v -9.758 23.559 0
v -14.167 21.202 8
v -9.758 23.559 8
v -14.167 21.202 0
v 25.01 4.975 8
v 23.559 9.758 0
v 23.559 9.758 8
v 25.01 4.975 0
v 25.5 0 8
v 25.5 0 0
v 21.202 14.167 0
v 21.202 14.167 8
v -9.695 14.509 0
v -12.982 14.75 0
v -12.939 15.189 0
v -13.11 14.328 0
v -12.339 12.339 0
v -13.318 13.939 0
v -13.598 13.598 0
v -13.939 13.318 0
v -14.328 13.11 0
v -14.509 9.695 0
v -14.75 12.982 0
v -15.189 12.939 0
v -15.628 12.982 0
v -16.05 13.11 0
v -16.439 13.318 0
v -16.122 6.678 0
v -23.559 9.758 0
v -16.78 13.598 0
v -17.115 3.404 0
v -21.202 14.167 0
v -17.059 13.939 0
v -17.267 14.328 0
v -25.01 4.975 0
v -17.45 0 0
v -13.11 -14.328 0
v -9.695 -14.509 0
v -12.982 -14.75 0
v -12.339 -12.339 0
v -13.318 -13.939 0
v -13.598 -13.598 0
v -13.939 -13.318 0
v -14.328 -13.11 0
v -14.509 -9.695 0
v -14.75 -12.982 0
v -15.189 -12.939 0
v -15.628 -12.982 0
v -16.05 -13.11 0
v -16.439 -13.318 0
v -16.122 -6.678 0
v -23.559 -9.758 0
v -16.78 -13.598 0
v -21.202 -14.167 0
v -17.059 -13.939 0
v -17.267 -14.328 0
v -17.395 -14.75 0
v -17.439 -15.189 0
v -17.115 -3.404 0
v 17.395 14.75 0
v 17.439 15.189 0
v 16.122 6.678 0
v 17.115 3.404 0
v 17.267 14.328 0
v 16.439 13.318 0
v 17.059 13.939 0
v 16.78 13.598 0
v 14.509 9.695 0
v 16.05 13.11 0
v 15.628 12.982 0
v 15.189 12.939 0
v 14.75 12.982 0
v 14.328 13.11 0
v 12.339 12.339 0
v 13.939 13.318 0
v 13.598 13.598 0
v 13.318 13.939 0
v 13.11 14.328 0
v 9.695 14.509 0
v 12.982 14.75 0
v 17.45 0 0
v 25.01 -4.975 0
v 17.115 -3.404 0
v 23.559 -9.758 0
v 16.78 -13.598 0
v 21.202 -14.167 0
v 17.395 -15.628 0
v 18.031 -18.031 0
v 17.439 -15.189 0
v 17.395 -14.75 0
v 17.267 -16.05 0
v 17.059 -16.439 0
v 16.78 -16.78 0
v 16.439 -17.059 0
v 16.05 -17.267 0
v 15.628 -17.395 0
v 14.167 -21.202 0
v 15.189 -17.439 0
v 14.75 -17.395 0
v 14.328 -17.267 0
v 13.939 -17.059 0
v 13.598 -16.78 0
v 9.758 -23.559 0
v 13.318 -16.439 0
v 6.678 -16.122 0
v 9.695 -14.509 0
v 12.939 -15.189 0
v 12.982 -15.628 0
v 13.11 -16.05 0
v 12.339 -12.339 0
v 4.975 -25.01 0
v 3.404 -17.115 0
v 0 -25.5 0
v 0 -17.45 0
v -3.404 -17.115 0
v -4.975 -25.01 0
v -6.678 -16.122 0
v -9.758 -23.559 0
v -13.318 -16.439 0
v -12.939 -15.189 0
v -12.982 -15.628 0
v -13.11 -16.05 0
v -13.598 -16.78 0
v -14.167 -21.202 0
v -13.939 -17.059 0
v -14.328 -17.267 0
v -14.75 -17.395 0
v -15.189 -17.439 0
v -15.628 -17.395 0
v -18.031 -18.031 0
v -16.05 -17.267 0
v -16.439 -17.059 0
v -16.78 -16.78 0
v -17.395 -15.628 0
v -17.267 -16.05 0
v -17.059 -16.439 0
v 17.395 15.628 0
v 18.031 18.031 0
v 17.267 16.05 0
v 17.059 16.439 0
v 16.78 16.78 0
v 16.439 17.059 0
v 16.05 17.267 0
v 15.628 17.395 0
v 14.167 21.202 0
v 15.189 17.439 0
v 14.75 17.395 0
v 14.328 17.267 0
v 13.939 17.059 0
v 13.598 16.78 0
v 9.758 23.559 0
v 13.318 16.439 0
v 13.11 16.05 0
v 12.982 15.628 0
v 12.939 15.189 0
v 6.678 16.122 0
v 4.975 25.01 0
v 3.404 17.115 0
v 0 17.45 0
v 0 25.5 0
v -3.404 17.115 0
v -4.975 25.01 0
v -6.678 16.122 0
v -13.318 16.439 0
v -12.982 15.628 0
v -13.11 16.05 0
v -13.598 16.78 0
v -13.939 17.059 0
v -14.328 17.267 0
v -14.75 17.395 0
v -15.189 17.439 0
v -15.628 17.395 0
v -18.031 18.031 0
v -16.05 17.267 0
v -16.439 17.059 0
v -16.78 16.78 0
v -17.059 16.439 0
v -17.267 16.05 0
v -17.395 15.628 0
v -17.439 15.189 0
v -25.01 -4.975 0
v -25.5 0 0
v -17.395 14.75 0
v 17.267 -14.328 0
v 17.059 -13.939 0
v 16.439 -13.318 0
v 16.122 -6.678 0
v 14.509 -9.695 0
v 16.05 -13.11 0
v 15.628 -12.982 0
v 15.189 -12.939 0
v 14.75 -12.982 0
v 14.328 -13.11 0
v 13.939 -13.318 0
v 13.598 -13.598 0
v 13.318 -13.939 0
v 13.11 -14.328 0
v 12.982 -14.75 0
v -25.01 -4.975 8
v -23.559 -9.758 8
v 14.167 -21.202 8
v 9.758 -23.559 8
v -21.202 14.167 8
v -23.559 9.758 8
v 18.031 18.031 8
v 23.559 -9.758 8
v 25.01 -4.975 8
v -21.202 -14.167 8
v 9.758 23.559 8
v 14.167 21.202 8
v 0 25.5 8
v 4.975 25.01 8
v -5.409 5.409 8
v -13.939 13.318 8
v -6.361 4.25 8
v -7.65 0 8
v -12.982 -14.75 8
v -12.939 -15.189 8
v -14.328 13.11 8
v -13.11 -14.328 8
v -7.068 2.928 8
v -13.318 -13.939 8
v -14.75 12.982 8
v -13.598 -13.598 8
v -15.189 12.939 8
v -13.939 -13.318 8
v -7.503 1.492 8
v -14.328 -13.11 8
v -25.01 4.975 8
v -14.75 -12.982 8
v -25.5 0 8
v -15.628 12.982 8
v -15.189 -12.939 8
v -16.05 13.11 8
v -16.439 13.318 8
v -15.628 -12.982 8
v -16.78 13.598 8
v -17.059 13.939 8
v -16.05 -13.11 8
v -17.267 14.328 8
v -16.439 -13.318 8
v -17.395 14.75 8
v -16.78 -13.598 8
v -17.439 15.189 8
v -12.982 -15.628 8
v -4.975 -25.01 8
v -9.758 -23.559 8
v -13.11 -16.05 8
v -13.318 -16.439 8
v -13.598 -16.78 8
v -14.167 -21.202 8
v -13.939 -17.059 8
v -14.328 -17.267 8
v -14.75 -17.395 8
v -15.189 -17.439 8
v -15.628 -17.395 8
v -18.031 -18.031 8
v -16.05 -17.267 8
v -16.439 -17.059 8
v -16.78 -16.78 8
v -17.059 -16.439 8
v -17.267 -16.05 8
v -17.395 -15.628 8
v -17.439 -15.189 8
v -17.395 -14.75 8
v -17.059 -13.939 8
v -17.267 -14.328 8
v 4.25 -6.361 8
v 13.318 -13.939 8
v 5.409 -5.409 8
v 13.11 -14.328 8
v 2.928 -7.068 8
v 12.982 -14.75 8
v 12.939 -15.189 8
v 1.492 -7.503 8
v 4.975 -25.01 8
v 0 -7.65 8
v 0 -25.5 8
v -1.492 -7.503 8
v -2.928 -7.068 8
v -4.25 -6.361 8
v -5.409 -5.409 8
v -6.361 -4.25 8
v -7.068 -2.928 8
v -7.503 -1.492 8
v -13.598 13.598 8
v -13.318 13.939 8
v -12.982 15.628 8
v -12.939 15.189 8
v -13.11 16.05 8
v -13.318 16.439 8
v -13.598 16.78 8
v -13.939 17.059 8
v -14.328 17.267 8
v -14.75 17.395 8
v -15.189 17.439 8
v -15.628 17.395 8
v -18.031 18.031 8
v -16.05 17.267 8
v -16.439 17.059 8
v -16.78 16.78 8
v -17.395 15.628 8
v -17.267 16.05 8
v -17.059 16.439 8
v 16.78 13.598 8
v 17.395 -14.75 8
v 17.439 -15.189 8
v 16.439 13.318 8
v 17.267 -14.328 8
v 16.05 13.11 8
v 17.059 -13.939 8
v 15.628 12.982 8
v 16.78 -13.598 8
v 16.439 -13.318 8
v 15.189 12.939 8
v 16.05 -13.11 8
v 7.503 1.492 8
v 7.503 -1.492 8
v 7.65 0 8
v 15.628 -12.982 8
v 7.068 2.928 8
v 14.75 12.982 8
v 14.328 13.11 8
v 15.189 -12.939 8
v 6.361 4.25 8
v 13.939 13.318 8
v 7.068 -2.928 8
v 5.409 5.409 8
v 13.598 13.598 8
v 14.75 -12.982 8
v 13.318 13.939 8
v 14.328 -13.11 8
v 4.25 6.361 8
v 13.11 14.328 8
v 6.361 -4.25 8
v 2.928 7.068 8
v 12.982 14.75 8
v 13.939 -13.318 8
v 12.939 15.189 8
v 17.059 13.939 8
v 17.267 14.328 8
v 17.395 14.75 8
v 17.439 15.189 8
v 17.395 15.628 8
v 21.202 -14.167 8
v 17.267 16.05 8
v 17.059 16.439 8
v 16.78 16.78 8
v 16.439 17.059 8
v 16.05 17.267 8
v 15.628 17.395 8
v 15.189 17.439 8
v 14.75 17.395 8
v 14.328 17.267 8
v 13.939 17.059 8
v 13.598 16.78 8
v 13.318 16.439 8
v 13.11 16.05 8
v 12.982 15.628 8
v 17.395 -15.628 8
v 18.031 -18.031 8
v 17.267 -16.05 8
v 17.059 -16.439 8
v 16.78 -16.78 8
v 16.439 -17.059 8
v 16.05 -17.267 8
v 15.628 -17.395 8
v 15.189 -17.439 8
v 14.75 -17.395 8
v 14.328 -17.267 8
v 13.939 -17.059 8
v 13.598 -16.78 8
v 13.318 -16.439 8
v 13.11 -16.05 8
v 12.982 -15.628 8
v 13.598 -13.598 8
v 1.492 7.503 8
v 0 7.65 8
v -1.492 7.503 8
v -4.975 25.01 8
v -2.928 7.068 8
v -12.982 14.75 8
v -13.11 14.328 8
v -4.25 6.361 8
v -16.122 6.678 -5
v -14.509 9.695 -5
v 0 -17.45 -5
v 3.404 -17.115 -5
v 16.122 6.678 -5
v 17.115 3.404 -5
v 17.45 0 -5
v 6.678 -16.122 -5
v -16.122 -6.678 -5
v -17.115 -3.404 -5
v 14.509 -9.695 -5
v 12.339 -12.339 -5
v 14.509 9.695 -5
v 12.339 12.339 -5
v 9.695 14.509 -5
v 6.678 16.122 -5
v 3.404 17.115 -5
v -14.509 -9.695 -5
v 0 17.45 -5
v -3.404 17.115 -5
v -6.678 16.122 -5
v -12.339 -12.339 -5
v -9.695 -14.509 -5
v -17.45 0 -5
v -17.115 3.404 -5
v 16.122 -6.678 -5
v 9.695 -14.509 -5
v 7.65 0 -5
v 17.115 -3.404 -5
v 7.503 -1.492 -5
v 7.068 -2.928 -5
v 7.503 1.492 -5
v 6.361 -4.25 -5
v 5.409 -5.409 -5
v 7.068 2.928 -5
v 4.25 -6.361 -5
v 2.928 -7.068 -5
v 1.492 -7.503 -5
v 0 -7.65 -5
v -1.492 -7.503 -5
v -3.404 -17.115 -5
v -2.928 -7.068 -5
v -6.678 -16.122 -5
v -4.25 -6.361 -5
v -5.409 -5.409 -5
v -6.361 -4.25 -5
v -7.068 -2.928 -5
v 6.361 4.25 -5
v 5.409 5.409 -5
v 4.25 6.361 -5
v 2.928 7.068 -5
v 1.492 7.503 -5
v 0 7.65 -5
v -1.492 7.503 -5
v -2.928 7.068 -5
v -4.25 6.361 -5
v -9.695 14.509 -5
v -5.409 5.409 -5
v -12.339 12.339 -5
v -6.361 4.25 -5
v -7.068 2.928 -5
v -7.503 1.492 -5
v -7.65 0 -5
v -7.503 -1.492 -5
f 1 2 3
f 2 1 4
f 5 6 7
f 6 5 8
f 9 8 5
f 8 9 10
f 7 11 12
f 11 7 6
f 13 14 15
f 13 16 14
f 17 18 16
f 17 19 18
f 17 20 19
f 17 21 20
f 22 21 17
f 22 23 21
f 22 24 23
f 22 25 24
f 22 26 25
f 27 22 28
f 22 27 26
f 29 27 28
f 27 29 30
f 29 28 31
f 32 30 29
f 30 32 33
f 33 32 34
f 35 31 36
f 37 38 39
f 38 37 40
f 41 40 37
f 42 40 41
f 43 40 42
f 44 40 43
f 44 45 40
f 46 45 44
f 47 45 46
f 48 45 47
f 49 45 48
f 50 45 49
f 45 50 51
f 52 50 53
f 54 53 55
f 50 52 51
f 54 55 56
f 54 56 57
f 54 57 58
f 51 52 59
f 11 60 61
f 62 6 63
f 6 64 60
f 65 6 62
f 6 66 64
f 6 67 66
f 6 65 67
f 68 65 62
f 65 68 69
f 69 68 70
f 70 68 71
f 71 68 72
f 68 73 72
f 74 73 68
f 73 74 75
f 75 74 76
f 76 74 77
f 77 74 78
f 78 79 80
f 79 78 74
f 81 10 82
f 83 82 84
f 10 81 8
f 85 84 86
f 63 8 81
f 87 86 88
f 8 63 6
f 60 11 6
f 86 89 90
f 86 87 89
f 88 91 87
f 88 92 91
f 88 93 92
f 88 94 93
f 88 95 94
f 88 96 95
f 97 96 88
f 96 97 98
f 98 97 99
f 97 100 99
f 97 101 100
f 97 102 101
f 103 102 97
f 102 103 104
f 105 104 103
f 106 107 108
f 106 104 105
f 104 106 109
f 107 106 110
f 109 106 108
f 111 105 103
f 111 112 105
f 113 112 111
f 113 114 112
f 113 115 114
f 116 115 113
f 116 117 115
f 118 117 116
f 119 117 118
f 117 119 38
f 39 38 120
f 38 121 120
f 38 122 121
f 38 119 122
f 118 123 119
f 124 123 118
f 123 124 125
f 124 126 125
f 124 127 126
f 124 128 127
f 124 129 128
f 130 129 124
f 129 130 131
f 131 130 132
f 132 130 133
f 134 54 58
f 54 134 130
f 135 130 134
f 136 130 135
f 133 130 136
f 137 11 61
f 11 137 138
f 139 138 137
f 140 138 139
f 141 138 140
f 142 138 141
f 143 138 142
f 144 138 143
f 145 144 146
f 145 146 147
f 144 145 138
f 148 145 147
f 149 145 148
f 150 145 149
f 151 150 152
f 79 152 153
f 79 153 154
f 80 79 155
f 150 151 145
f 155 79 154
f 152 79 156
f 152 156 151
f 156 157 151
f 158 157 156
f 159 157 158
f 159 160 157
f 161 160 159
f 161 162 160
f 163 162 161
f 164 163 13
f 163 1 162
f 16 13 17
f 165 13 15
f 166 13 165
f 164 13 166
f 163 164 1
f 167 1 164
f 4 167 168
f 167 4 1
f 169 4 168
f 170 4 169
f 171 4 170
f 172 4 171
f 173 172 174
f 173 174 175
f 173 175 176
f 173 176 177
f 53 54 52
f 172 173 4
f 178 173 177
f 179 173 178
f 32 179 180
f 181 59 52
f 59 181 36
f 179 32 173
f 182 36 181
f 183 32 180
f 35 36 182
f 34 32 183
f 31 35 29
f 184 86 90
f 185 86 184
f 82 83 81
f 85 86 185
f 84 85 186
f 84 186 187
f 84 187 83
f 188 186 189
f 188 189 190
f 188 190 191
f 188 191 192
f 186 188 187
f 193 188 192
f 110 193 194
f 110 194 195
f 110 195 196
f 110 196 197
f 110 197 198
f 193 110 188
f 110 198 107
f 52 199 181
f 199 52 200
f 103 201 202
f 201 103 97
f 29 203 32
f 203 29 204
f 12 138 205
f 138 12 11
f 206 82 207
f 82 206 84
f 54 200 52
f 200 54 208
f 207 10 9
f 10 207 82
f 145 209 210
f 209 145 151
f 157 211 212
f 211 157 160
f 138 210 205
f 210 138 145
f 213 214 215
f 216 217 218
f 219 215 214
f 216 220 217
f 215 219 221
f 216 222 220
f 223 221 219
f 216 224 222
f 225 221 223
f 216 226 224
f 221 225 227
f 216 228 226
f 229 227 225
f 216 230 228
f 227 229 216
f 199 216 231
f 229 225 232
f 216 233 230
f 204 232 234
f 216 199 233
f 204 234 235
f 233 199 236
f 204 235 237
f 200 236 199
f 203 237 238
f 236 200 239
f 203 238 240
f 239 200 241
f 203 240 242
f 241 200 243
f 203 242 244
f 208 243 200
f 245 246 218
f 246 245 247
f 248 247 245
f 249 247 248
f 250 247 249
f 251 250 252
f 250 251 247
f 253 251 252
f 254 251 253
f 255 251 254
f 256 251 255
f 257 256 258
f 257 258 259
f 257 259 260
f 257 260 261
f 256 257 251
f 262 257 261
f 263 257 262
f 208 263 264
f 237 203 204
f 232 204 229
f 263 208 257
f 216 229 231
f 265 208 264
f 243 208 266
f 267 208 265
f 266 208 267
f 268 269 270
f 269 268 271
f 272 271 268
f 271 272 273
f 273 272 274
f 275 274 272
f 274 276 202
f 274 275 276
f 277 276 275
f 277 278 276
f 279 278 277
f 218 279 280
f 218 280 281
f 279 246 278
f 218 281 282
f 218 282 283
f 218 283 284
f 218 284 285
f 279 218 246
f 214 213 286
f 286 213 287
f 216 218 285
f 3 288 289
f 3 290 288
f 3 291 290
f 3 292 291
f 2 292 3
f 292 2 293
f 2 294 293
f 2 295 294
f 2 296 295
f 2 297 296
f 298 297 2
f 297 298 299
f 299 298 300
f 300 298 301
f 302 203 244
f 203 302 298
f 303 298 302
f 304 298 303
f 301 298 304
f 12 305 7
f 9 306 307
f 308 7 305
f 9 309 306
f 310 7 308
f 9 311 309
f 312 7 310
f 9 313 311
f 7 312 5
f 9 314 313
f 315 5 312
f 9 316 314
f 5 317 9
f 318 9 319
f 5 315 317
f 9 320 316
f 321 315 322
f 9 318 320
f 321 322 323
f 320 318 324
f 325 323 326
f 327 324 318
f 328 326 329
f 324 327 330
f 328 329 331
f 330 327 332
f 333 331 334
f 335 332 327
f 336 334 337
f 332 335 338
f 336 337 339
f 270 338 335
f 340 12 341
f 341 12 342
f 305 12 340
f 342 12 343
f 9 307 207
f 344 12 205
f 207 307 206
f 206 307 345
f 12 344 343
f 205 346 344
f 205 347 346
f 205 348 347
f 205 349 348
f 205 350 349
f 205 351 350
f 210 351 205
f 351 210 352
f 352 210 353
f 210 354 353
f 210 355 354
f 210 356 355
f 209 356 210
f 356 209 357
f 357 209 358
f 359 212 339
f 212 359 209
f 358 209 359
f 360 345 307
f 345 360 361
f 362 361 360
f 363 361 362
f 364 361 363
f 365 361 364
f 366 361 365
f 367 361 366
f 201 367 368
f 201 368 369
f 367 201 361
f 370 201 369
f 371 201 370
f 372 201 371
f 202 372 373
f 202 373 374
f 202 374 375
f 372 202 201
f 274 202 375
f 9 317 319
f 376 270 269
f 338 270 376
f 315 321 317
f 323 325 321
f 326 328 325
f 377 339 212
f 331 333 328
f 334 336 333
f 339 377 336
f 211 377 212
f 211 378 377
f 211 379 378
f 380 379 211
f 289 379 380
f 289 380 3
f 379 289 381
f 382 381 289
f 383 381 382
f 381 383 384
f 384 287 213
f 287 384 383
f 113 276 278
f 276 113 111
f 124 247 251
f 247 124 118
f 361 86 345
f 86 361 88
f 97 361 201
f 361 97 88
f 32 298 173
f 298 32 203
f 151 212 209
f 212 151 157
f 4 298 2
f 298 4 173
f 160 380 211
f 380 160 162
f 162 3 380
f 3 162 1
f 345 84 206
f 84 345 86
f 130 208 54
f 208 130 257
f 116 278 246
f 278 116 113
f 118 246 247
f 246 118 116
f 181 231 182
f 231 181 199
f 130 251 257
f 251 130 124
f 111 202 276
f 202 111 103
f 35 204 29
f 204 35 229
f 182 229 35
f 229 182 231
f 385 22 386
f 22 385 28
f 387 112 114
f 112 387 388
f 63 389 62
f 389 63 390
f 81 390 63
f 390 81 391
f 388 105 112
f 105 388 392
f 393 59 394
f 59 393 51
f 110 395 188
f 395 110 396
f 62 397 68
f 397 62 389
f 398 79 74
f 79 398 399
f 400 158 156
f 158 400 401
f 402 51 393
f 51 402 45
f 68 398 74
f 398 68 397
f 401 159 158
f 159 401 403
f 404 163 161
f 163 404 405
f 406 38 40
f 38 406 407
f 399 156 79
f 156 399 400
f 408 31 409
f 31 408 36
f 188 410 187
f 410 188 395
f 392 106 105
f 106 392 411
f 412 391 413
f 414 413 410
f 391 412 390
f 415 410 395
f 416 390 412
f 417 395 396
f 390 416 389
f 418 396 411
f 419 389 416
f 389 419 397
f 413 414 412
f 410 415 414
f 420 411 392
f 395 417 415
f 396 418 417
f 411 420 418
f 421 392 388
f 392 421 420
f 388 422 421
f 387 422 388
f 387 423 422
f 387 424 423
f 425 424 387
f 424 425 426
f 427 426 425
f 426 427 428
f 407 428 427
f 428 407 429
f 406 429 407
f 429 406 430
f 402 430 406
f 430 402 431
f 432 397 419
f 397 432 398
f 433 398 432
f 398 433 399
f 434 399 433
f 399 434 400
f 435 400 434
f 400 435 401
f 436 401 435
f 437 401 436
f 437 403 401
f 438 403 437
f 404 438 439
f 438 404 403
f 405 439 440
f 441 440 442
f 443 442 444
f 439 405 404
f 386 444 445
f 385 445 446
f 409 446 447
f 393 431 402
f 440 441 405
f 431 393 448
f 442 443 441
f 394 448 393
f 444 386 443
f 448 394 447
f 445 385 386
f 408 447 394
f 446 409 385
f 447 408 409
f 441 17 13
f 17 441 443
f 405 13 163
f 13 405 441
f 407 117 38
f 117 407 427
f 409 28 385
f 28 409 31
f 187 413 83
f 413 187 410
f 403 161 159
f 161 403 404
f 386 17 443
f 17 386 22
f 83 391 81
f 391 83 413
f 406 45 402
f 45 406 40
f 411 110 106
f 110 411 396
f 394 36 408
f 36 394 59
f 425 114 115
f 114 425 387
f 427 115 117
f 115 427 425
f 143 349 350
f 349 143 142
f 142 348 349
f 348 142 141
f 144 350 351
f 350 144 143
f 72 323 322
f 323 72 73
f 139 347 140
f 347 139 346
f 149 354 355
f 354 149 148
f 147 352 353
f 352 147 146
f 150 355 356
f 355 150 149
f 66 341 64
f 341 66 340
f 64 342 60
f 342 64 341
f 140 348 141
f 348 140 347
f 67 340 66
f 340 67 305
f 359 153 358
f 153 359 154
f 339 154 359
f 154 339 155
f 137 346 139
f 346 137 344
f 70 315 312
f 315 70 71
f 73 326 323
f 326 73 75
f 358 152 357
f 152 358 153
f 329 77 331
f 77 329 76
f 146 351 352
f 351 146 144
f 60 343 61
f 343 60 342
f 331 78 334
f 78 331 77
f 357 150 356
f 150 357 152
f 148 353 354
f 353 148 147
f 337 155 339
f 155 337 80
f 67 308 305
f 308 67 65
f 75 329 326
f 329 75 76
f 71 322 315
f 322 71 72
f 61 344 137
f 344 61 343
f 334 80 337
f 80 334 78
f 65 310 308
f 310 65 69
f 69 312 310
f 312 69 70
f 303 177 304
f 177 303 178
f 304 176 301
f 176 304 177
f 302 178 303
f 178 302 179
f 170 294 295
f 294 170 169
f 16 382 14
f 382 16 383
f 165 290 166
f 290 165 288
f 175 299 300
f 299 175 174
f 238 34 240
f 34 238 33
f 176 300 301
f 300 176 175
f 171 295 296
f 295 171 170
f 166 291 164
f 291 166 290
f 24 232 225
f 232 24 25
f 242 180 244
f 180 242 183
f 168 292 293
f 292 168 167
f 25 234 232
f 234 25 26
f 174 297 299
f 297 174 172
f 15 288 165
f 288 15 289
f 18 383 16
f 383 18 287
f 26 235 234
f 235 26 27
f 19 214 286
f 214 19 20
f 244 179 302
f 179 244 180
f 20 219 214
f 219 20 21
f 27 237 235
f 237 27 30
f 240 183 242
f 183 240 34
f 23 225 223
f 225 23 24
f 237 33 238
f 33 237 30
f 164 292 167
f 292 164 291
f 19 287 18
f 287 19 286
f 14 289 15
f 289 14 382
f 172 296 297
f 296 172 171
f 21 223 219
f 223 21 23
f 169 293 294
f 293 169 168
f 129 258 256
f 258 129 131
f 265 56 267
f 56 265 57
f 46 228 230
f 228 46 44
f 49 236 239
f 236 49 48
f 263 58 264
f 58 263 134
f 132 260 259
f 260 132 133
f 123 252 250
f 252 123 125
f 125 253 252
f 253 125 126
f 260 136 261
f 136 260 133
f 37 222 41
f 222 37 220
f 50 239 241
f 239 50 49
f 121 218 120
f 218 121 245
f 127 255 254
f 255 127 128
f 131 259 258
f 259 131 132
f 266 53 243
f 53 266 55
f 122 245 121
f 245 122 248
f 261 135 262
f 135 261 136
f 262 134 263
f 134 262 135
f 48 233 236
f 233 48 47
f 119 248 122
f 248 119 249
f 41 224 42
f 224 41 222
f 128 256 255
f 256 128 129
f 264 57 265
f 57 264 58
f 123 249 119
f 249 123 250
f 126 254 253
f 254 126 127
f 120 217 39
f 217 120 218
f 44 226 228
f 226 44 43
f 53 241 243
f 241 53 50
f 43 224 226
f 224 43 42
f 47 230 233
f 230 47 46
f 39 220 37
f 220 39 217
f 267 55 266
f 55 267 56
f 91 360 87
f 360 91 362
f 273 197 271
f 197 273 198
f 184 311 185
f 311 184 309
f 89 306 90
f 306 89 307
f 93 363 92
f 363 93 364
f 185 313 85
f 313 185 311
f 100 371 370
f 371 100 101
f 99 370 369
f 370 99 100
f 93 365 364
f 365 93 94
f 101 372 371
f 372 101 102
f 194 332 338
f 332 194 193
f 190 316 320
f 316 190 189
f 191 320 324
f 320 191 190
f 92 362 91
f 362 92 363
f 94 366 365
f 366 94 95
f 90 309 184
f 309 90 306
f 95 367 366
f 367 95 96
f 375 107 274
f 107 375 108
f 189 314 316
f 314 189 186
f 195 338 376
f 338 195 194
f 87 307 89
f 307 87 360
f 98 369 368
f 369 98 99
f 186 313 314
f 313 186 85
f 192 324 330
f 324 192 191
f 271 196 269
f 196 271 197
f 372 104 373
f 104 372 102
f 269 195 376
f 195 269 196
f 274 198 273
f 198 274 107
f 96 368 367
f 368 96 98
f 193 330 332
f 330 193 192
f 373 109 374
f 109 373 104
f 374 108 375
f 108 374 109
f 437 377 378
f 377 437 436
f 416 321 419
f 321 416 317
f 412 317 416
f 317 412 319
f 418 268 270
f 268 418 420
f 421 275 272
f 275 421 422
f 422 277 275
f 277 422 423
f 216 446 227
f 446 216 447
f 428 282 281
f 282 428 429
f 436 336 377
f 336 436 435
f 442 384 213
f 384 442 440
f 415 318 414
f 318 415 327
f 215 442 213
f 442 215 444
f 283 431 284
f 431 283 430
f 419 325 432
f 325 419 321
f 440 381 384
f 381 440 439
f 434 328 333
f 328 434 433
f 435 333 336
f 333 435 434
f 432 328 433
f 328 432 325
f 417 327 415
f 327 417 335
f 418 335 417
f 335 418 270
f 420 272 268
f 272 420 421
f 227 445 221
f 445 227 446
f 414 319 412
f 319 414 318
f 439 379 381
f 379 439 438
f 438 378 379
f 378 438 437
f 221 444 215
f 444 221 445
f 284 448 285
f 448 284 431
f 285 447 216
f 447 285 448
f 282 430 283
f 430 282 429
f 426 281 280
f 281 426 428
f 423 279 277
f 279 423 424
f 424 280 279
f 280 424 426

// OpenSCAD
$fn = 32;

// ----------------------------------------------------------------------
// Retaining cap: 6202 cover, 51 mm, spigot 34.9 mm
// ----------------------------------------------------------------------

// --- parameters (mm) ---
cover_d = 51;             // cover diameter
cover_t = 8;              // cover thickness
spigot_d = 34.9;          // spigot that enters the housing
spigot_h = 5;             // spigot height
shaft_d = 15.3;           // shaft opening
bolt_d = 4.5;             // bolt clearance
bolt_r = 21.48;           // bolt circle radius

module cover() {
  cylinder(h = cover_t, d = cover_d);
}

module spigot() {
  /* sunk 1 mm into the cover; the spigot sets the overall height */
  translate([0, 0, -spigot_h]) cylinder(h = spigot_h + 1, d = spigot_d);
}

difference() {
  union() {
    cover();
    spigot();
  }
  for (i = [0 : 3]) rotate([0, 0, 45 + i * 90]) translate([bolt_r, 0, -spigot_h - 1])
    cylinder(h = spigot_h + cover_t + 2, d = bolt_d);
  translate([0, 0, -spigot_h - 1]) cylinder(h = spigot_h + cover_t + 2, d = shaft_d);
}
